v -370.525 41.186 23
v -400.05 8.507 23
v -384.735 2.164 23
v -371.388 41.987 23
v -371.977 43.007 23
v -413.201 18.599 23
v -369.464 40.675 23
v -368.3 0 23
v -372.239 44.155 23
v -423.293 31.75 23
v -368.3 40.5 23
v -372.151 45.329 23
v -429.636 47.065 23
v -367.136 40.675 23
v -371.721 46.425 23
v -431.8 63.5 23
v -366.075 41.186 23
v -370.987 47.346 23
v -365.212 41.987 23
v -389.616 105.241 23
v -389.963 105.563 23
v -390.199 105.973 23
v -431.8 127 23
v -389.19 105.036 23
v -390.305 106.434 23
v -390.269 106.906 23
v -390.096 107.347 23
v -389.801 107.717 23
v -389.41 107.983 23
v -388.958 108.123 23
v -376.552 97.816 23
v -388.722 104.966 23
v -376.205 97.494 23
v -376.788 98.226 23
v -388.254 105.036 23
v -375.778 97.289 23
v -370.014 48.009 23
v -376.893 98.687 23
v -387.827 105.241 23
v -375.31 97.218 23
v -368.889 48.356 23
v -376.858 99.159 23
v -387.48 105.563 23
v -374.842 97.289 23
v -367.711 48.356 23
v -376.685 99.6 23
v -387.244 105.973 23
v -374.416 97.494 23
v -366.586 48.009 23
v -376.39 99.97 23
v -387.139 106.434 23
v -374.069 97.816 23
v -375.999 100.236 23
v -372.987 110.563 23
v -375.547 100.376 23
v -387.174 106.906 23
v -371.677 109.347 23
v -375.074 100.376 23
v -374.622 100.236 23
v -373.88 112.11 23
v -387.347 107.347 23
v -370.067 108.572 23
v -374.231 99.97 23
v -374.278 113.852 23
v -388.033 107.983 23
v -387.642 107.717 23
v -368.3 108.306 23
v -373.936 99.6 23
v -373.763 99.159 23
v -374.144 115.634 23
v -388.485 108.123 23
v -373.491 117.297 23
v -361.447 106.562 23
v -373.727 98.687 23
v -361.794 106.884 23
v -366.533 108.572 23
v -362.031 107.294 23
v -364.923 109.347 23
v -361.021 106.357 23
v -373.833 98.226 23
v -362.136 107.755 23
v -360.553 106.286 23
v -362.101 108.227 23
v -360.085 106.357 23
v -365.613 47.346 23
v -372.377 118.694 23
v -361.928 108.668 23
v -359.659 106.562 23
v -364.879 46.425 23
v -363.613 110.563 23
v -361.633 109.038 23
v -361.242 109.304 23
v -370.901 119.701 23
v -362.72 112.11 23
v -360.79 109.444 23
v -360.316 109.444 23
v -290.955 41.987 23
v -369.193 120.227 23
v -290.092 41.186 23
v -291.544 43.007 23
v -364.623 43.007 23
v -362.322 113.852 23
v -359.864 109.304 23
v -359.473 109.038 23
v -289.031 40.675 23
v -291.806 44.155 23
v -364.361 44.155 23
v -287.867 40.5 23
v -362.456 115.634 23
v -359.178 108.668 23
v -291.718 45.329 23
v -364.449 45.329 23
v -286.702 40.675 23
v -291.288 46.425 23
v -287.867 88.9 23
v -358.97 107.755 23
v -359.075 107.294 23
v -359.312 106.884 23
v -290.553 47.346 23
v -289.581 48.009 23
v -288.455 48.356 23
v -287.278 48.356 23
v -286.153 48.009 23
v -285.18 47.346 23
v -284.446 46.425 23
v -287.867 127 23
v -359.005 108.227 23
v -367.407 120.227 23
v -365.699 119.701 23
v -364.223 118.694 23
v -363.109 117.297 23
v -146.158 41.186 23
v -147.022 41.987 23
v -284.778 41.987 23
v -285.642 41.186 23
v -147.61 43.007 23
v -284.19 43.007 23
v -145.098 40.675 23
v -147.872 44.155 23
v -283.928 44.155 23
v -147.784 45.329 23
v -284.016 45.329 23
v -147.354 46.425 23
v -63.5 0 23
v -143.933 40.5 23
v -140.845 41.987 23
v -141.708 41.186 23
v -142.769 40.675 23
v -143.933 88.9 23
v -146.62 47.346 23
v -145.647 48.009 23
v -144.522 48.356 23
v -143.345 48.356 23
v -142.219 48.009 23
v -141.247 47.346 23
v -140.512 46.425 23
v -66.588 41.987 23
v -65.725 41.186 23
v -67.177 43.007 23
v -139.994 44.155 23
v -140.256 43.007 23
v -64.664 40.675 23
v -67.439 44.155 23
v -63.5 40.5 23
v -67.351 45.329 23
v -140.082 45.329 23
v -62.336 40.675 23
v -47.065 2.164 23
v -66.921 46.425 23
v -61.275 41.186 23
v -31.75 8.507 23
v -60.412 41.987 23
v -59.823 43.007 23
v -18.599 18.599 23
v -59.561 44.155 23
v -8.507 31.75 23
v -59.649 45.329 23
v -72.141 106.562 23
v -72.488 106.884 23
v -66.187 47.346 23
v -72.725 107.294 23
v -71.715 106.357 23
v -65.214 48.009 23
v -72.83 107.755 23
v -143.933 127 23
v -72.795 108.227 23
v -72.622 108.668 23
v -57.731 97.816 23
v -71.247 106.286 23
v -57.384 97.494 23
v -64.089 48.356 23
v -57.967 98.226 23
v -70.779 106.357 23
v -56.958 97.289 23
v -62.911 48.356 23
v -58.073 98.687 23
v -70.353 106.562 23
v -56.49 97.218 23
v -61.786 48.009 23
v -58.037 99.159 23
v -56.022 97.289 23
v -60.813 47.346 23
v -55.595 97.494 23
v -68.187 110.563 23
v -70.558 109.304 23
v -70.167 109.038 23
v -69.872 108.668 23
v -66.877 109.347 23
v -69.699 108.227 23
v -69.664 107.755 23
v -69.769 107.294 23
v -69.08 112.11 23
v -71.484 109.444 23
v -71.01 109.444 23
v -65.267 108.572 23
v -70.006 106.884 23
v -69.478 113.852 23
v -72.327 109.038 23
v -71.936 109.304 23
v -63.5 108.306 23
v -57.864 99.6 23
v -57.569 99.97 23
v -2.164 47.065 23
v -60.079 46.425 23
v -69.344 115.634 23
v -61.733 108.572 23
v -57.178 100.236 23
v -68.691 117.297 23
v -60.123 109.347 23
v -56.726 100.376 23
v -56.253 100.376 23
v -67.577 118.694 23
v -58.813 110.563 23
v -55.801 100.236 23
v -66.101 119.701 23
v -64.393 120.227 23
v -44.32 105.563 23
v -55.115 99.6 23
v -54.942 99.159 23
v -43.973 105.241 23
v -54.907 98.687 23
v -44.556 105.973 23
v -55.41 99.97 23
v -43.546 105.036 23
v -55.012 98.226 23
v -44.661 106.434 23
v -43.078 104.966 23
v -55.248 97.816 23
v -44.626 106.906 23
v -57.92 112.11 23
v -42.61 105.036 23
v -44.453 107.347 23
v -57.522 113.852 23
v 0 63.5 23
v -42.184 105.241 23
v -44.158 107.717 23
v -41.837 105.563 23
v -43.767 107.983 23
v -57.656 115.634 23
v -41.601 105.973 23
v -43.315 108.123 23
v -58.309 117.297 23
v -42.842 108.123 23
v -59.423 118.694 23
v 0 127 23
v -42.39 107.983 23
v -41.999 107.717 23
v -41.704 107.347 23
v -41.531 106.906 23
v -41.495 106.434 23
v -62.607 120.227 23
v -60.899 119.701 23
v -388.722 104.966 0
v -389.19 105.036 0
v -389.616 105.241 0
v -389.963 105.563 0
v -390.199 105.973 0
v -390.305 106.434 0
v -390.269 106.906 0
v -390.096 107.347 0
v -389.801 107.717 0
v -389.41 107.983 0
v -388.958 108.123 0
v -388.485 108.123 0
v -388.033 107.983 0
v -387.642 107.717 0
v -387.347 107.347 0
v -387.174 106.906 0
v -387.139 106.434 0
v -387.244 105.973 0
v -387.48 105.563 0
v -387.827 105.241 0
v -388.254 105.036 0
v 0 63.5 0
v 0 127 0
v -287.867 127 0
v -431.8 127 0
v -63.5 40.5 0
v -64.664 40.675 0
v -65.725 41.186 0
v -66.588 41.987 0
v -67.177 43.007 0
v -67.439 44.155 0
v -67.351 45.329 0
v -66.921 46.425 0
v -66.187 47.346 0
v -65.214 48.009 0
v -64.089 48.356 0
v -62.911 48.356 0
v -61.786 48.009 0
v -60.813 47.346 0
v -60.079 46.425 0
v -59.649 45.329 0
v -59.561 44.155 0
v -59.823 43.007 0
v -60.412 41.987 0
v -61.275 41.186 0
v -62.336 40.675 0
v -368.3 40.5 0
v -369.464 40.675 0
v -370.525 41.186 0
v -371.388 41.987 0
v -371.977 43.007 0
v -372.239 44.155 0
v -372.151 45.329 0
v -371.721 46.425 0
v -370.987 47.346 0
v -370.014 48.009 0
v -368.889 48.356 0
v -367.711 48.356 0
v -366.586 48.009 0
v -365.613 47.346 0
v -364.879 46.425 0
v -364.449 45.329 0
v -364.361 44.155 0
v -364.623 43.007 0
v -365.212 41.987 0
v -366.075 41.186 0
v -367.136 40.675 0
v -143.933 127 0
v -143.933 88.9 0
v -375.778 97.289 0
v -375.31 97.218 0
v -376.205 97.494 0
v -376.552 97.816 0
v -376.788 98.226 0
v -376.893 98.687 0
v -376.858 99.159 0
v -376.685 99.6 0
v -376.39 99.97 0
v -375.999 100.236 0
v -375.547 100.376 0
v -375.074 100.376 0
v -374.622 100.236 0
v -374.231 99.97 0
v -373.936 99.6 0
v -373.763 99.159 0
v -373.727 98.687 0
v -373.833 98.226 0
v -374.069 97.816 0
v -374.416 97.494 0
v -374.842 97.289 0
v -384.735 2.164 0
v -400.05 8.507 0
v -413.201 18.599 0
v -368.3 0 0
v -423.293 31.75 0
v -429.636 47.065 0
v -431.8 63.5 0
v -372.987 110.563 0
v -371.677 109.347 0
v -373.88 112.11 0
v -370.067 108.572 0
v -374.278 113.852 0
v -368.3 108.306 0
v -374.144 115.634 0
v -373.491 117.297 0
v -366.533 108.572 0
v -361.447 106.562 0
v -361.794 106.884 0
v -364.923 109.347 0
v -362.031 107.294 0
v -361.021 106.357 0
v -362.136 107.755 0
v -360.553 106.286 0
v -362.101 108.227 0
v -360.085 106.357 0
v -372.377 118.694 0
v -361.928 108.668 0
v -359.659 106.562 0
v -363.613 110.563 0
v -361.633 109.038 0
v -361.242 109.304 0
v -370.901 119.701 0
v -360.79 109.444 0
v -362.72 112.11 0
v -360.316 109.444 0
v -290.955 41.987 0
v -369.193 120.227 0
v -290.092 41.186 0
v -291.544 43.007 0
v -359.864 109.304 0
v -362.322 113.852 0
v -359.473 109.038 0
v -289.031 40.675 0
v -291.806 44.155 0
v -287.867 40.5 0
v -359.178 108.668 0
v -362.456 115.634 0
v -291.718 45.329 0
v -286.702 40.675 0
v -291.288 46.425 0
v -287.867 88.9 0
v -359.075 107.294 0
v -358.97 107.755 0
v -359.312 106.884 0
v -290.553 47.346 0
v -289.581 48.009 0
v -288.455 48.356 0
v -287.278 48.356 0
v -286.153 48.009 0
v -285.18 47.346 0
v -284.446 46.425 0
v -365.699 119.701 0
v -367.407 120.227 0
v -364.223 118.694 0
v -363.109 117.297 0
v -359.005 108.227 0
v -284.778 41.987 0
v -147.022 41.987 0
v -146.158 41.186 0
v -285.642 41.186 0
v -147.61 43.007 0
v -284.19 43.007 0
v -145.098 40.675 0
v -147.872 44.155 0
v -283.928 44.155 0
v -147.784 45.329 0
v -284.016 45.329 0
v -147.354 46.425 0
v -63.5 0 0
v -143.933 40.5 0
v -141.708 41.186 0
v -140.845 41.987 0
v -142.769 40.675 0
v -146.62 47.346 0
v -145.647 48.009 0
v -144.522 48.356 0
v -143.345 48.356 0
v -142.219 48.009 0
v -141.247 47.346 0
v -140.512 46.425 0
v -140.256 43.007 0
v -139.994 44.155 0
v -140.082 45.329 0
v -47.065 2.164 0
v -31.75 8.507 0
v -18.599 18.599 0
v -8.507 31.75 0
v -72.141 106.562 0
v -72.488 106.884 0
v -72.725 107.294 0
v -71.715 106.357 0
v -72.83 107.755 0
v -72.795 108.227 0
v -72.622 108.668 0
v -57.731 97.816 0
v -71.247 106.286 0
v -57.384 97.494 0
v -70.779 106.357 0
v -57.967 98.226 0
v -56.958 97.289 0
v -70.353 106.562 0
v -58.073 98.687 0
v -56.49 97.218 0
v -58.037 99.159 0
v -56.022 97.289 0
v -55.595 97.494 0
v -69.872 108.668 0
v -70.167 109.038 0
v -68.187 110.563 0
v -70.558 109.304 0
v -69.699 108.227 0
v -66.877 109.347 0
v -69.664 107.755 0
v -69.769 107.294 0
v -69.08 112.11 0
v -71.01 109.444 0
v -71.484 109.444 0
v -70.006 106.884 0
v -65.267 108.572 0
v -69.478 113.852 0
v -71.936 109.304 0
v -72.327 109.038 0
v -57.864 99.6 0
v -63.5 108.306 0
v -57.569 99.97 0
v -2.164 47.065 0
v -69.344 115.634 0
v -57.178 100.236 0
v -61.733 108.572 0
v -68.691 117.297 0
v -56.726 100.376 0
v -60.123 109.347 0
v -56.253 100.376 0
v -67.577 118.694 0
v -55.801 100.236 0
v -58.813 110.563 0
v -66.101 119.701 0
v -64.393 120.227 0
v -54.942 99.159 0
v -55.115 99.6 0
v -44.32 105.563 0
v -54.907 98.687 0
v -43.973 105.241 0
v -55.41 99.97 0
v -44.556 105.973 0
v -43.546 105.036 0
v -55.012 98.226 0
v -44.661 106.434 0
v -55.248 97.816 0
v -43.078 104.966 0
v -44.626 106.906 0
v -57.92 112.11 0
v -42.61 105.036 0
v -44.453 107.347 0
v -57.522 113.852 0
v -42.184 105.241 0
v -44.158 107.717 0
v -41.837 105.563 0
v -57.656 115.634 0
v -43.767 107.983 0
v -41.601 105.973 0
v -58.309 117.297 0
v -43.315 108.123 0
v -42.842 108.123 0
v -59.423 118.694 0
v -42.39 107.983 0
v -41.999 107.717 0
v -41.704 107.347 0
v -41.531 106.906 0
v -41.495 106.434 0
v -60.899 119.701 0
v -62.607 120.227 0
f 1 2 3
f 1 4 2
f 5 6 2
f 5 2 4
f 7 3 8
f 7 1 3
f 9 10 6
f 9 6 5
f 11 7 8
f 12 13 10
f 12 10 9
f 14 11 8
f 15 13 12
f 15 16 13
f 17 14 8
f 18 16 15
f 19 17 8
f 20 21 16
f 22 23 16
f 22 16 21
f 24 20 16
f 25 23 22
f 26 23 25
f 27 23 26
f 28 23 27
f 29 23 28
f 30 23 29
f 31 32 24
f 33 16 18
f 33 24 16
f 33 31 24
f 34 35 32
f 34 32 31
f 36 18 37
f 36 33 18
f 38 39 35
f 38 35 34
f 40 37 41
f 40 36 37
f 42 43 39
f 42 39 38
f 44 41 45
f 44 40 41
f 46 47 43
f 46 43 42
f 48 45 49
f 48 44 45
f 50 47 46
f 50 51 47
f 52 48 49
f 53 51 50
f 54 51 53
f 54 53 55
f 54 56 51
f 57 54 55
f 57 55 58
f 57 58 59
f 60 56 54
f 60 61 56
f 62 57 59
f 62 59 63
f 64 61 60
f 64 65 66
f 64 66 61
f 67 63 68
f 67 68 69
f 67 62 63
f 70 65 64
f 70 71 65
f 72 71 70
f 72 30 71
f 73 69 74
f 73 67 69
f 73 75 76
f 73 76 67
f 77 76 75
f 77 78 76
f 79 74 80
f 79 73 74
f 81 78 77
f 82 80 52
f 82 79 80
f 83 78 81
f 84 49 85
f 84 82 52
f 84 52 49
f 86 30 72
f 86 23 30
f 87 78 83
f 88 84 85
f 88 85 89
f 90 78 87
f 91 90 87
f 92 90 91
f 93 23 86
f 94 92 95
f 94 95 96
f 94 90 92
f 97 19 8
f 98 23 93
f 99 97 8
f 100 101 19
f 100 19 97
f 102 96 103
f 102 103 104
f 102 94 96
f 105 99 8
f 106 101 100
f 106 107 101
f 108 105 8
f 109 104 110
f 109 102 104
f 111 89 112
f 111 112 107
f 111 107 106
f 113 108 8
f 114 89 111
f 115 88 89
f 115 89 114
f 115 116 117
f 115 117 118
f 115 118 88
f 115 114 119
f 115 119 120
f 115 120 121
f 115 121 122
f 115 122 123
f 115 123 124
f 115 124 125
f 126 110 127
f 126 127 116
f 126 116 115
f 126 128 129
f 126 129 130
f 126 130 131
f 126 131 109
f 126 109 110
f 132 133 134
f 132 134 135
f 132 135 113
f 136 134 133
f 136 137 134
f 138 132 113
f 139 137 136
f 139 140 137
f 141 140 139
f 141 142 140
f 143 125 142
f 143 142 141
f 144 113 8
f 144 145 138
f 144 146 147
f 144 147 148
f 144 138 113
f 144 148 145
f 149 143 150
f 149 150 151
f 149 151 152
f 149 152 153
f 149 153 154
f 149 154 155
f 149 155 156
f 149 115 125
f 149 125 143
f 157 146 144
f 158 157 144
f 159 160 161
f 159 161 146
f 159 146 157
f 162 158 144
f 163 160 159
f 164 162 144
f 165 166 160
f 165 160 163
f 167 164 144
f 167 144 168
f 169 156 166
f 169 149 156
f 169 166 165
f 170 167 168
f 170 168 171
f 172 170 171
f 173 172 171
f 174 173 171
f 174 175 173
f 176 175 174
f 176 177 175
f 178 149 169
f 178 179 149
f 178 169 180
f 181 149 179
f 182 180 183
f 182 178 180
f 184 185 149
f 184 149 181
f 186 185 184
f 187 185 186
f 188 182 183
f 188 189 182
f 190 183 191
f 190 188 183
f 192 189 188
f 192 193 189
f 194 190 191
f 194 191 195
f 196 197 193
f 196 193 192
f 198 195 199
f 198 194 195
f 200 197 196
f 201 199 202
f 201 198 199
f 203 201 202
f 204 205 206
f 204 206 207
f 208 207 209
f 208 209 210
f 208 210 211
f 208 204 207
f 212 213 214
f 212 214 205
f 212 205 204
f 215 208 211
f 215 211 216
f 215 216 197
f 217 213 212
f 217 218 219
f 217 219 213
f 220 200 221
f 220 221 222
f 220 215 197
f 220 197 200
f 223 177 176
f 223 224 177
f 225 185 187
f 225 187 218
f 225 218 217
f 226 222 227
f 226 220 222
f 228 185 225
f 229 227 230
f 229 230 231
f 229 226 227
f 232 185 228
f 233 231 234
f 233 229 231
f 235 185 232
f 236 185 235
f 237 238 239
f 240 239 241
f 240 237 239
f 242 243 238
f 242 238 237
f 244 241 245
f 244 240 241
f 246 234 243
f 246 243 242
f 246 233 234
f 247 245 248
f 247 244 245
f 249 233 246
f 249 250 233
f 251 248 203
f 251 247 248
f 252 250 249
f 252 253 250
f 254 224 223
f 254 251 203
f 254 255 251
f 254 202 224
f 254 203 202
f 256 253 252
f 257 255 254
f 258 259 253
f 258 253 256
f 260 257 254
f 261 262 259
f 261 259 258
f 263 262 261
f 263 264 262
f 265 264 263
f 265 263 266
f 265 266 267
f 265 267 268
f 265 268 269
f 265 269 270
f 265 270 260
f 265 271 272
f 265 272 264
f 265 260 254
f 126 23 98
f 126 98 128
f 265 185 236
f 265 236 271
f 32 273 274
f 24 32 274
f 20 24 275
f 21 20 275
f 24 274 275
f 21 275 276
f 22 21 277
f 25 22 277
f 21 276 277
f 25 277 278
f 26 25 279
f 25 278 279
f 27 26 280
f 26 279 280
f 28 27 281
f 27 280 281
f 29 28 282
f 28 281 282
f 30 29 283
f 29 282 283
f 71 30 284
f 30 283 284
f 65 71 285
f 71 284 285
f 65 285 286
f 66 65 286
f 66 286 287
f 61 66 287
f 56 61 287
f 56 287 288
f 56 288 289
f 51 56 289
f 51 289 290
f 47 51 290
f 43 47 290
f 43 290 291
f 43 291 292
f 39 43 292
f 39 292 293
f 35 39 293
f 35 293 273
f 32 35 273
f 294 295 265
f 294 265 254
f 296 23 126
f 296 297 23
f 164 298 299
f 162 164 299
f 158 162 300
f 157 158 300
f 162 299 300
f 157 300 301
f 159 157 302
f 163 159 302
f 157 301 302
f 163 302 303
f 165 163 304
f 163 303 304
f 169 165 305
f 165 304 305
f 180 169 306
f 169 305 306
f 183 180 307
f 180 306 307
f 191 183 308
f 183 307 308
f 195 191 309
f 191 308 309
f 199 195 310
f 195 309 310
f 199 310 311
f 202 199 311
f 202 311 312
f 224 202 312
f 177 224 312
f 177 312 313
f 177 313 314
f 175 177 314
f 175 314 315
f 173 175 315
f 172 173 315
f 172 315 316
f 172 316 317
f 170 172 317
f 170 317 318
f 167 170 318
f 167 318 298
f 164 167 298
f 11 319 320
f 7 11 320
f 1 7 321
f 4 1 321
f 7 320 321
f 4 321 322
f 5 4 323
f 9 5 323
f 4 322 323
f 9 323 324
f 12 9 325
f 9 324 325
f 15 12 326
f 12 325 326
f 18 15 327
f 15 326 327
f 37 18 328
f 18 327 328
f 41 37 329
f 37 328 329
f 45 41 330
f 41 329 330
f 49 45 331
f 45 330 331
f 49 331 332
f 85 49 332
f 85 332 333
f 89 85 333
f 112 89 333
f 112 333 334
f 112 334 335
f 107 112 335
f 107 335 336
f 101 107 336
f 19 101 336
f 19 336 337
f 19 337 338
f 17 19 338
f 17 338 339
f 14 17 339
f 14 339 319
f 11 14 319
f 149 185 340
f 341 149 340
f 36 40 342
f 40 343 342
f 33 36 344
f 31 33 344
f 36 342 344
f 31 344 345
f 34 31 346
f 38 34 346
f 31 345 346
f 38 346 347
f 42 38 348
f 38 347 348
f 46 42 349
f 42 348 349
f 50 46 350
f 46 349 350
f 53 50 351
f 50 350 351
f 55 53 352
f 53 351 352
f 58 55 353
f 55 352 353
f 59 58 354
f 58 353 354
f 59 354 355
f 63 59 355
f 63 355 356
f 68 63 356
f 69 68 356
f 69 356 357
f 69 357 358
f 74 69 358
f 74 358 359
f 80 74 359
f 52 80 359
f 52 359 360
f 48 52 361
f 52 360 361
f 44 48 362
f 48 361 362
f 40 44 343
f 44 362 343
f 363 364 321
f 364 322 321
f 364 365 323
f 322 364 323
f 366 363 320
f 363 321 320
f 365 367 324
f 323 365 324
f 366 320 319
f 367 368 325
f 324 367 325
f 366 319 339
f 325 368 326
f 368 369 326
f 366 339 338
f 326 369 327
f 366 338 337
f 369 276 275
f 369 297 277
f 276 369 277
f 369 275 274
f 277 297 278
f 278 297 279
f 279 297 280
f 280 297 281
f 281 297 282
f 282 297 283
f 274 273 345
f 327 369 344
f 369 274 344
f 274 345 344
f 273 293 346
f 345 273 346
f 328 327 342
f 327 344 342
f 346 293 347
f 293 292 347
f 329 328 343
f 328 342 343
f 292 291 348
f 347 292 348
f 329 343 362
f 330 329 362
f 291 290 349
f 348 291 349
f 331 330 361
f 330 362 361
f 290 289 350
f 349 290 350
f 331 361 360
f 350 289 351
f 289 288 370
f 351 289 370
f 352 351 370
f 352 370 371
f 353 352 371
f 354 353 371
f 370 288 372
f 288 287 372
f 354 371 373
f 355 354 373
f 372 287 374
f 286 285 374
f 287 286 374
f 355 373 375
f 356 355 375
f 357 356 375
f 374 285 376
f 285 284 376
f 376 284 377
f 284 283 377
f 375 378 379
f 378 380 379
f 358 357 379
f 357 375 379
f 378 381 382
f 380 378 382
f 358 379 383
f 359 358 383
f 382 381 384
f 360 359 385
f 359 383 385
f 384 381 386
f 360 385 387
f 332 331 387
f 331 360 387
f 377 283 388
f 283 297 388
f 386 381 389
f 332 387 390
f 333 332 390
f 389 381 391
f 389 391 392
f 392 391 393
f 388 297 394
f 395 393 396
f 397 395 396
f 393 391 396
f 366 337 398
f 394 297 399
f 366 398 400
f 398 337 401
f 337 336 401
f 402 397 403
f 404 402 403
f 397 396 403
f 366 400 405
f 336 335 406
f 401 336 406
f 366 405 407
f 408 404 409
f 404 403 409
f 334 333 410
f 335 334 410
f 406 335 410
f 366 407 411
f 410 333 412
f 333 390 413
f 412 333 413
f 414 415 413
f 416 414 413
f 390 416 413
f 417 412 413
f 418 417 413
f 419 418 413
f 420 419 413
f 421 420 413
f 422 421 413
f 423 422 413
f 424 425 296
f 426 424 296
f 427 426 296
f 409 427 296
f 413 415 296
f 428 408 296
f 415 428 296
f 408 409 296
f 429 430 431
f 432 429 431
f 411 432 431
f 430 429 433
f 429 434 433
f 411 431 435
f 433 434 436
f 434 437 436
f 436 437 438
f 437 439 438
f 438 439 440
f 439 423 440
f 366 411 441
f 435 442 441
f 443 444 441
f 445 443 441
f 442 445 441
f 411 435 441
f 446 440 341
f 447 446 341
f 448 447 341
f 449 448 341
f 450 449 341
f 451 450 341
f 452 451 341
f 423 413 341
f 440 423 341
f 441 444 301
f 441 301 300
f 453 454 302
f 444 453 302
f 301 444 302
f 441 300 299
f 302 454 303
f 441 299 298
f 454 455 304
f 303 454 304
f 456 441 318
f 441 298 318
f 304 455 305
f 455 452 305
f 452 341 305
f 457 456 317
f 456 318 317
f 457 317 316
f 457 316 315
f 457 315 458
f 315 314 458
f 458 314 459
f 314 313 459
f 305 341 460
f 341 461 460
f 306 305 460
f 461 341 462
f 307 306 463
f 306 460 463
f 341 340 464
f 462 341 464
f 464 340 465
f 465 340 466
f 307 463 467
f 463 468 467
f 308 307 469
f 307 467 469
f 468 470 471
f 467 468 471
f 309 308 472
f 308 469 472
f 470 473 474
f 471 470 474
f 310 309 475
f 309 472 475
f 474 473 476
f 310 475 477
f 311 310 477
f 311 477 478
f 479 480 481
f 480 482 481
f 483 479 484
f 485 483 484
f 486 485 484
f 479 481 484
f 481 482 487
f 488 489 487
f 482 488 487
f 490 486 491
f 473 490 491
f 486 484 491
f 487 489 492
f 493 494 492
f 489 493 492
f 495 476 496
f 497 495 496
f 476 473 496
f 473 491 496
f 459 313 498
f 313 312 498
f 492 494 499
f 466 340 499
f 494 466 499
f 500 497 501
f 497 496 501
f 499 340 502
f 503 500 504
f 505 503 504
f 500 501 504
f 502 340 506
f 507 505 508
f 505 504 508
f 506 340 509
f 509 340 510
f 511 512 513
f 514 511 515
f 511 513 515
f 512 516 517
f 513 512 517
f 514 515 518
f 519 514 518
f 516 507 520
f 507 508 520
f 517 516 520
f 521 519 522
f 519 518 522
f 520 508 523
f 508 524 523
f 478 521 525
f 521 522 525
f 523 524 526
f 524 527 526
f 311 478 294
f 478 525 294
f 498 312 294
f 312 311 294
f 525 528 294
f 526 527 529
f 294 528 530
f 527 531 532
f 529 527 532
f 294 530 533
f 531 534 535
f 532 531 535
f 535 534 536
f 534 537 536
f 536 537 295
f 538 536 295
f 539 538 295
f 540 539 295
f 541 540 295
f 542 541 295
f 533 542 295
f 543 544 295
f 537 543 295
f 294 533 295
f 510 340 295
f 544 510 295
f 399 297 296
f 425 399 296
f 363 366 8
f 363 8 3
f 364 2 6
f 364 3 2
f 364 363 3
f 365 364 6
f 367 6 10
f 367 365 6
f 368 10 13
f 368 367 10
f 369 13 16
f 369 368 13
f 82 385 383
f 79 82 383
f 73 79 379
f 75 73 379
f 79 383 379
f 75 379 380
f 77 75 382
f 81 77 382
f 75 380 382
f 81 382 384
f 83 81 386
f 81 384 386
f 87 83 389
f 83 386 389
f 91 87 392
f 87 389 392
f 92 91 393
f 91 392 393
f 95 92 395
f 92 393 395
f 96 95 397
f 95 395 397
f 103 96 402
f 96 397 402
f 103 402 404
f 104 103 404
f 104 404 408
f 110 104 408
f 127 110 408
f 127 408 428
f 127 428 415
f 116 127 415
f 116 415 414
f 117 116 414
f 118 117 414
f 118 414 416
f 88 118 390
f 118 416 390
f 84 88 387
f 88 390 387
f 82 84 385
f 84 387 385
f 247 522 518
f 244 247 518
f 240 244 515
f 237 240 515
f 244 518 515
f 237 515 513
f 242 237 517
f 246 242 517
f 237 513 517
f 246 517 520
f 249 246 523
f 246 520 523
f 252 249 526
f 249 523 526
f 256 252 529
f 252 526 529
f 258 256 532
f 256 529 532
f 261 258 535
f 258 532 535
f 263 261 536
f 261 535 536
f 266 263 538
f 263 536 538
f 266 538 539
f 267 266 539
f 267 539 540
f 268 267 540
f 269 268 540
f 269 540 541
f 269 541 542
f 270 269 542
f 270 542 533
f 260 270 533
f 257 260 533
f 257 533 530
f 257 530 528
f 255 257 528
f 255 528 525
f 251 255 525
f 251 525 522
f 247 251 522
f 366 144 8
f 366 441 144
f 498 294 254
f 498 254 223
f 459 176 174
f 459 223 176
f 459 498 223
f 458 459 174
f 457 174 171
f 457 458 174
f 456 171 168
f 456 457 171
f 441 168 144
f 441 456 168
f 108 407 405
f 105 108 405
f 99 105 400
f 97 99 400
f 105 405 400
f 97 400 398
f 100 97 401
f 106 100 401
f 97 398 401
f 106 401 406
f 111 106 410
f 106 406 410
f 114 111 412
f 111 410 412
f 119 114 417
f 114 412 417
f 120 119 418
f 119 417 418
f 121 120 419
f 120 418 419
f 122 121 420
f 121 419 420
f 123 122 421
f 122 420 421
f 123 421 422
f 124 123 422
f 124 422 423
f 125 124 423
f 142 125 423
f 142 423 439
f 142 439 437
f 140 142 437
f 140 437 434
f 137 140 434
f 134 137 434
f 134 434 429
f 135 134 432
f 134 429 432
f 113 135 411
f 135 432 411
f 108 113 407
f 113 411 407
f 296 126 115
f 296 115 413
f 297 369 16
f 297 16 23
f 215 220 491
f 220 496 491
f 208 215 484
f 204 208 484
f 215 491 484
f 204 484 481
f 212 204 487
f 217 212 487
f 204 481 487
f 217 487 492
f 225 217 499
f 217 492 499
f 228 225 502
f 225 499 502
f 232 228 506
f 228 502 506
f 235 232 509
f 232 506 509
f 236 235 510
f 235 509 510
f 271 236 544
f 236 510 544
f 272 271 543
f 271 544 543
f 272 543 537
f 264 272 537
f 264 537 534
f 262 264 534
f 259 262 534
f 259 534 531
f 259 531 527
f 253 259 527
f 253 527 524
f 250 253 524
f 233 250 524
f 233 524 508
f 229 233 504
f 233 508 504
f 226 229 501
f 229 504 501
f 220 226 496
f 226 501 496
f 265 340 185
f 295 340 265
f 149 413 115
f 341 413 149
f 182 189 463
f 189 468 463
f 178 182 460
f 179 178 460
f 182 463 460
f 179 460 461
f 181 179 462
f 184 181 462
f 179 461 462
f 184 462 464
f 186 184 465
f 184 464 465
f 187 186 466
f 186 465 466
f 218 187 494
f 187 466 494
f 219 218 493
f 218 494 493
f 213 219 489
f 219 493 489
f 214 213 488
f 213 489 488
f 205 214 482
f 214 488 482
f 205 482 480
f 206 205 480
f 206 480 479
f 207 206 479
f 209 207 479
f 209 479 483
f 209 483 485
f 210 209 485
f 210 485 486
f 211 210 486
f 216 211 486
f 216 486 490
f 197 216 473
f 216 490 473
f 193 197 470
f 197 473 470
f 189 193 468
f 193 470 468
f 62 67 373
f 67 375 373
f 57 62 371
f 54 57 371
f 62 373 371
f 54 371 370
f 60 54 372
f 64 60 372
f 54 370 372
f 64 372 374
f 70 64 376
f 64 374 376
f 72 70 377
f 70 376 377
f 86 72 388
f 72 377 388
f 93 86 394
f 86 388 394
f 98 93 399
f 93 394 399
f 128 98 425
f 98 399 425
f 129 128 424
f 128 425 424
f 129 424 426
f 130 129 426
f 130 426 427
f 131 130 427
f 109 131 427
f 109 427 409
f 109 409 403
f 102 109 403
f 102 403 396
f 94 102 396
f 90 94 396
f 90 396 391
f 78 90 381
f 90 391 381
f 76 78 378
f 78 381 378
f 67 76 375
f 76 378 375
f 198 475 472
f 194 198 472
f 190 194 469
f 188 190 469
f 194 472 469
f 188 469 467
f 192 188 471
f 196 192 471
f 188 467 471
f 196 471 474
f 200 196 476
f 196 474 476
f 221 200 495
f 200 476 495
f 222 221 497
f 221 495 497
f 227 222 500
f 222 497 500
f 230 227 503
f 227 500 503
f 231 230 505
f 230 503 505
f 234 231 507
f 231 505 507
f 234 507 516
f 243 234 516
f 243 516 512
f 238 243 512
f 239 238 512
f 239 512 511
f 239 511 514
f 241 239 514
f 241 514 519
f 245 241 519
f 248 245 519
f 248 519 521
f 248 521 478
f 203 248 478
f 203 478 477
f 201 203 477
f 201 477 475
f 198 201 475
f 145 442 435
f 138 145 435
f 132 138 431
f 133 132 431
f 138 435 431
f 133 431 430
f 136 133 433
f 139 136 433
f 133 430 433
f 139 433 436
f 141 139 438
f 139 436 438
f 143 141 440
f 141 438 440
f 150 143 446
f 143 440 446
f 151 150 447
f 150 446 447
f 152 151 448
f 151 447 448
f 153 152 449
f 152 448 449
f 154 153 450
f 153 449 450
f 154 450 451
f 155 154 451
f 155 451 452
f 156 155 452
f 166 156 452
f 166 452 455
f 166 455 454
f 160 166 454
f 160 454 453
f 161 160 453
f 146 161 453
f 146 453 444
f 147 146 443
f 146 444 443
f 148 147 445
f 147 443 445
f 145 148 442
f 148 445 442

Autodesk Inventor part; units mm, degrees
ref_plane "YZ Plane" through (0, 0, 0) normal (1, 0, 0) x (0, 1, 0)
ref_plane "XZ Plane" through (0, 0, 0) normal (0, 1, 0) x (-1, 0, 0)
ref_plane "XY Plane" through (0, 0, 0) normal (0, 0, 1) x (1, 0, 0)
sketch "Sketch1" plane through (0, 0, 0) normal (0, 0, 1) x (1, 0, 0)
  line L0 (-63.5, 0) -> (-368.3, 0)
  line L1 (-431.8, 63.5) -> (-431.8, 88.9)
  line L2 (-431.8, 88.9) -> (0, 88.9)
  line L3 (0, 88.9) -> (0, 63.5)
  arc A0 (-431.8, 63.5) -> (-368.3, 0) centre (-368.3, 63.5) ccw
  arc A1 (-63.5, 0) -> (0, 63.5) centre (-63.5, 63.5) ccw
  line L4 (-431.8, 88.9) -> (-287.8667, 88.9)
  line L5 (0, 88.9) -> (-143.9333, 88.9)
  point P0 (0, 0)
  point P1 (-431.8, 0)
  dimension "d0" = 431.8
  dimension "d1" = 88.9
  dimension "d2" = 63.5
  dimension "d3" = 63.5
extrude "Extrusion1" add sketch "Sketch1" along normal blind 23
sketch "Sketch2" plane through (0, 0, 23) normal (0, 0, 1) x (1, 0, 0)
  line L0 (-368.3, 0) -> (-63.5, 0) projected
  line L1 (0, 88.9) -> (-431.8, 88.9) projected
  line L2 (0, 63.5) -> (0, 88.9) projected
  line L3 (-431.8, 88.9) -> (-431.8, 63.5) projected
  point P0 (0, 0)
  point P1 (-368.3, 44.45)
  point P2 (-287.8667, 44.45)
  point P3 (-143.9333, 44.45)
  point P4 (-63.5, 44.45)
  dimension "d6" = 88.9
  dimension "d7" = 44.45
  dimension "d8" = 44.45
  dimension "d9" = 44.45
  dimension "d10" = 44.45
  dimension "d11" = 431.8
  dimension "d12" = 63.5
  dimension "d13" = 143.9333
  dimension "d14" = 143.9333
  dimension "d15" = 63.5
hole "Hole1" at (-368.3, 44.45, 23) at (-287.8667, 44.45, 23) at (-143.9333, 44.45, 23) at (-63.5, 44.45, 23) direction (0, 0, -1) diameter 7.9 end through all
sketch "Sketch3" plane through (-431.8, 88.9, 0) normal (0, 1, 0) x (1, 0, 0)
  line L0 (431.8, 0) -> (0, 0) projected
  line L1 (0, -23) -> (143.9333, -23)
  line L2 (143.9333, -23) -> (143.9333, 0)
  line L3 (143.9333, 0) -> (0, 0)
  line L4 (0, 0) -> (0, -23)
  line L5 (431.8, -23) -> (0, -23) projected
  line L6 (431.8, -23) -> (287.8667, -23)
  line L7 (287.8667, -23) -> (287.8667, 0)
  line L8 (287.8667, 0) -> (431.8, 0)
  line L9 (431.8, 0) -> (431.8, -23)
  dimension "d27" = 431.8
  dimension "d28" = 143.9333
  dimension "d29" = 143.9333
extrude "Extrusion2" add sketch "Sketch3" along normal blind 38.1 contours L9 L5 L7 L0 | L2 L1 L4 L0
sketch "Sketch4" plane through (0, 0, 23) normal (0, 0, 1) x (1, 0, 0)
  line L0 (-143.9333, 88.9) -> (-143.9333, 127) projected
  line L1 (-287.8667, 88.9) -> (-287.8667, 127) projected
  line L2 (-143.9333, 127) -> (0, 127) projected
  line L3 (-431.8, 127) -> (-287.8667, 127) projected
  circle A0 centre (-368.3, 44.45) radius 3.95 projected
  circle A1 centre (-63.5, 44.45) radius 3.95 projected
  point P0 (0, 0)
  point P1 (-63.5, 114.3)
  point P2 (-368.3, 114.3)
  dimension "d32" = 38.1
  dimension "d33" = 38.1
  dimension "d34" = 12.7
  dimension "d35" = 12.7
  dimension "d38" = 0
  dimension "d39" = 0
hole "Hole2" at (-63.5, 114.3, 23) at (-368.3, 114.3, 23) direction (0, 0, -1) diameter 11.9888 end through all
sketch "Sketch5" plane through (0, 0, 23) normal (0, 0, 1) x (1, 0, 0)
  circle A0 centre (-368.3, 114.3) radius 5.9944 projected
  circle A1 centre (-63.5, 114.3) radius 5.9944 projected
  point P0 (0, 0)
  point P1 (-360.553, 107.8738)
  point P2 (-375.3104, 98.806)
  point P3 (-388.7216, 106.553)
  point P4 (-71.247, 107.8738)
  point P5 (-56.4896, 98.806)
  point P6 (-43.0784, 106.553)
  dimension "d47" = 7.747
  dimension "d48" = 6.4262
  dimension "d49" = 7.0104
  dimension "d50" = 15.494
  dimension "d51" = 20.4216
  dimension "d52" = 7.747
  dimension "d53" = 7.747
  dimension "d54" = 6.4262
  dimension "d55" = 15.494
  dimension "d56" = 7.0104
  dimension "d57" = 7.747
  dimension "d58" = 20.4216
hole "Hole3" at (-360.553, 107.8738, 23) at (-375.3104, 98.806, 23) at (-388.7216, 106.553, 23) at (-71.247, 107.8738, 23) at (-56.4896, 98.806, 23) at (-43.0784, 106.553, 23) direction (0, 0, -1) diameter 3.175 end through all
equation "\"d7\" = 0.5 * d6"
equation "\"d8\" = 0.5 * d6"
equation "\"d9\" = 0.5 * d6"
equation "\"d10\" = 0.5 * d6"
equation "\"d13\" = 0.333333 * d11"
equation "\"d14\" = d13"
equation "\"d15\" = d12"
equation "\"d28\" = 0.333333 * d27"
equation "\"d29\" = d28"
equation "\"d34\" = 0.333333 * d32"
equation "\"d35\" = 0.333333 * d33"
equation "\"d53\" = d47"
equation "\"d54\" = d48"
equation "\"d55\" = d50"
equation "\"d56\" = d49"
equation "\"d57\" = d52"
equation "\"d58\" = d51"
properties part number "side drivetrain piece (8 wheel macanum)"
